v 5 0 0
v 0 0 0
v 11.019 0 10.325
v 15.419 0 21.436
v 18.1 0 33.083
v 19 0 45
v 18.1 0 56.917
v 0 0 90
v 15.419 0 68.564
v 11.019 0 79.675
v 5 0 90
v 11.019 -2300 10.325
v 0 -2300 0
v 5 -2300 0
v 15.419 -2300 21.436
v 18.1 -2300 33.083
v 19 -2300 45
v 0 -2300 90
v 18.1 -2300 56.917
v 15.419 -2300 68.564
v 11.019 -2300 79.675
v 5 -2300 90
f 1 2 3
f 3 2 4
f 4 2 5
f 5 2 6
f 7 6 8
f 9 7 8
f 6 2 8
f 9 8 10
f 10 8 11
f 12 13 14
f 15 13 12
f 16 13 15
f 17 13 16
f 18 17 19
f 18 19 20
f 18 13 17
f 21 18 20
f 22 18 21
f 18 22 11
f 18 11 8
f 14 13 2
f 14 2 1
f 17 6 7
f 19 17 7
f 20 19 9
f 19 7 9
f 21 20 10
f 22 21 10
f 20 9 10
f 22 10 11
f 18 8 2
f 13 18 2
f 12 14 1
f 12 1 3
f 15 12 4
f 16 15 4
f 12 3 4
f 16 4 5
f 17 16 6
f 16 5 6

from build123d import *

# Parameters (mm, degrees)
F1_DEPTH = 2300


with BuildPart() as f1:
    # F0 (on Front) → F1 (new body)
    with BuildSketch(Plane.XZ):
        with BuildLine():
            Line((0, 45), (0, 0))
            Line((0, 0), (5, 0))
            ThreePointArc((5, 0), (15.419175, 21.436257), (19, 45))
            Line((19, 45), (0, 45))
        make_face()
        with BuildLine():
            Line((0, 90), (0, 45))
            Line((0, 45), (19, 45))
            ThreePointArc((19, 45), (15.419175, 68.563743), (5, 90))
            Line((5, 90), (0, 90))
        make_face()
    extrude(amount=F1_DEPTH)


solid = f1.part
